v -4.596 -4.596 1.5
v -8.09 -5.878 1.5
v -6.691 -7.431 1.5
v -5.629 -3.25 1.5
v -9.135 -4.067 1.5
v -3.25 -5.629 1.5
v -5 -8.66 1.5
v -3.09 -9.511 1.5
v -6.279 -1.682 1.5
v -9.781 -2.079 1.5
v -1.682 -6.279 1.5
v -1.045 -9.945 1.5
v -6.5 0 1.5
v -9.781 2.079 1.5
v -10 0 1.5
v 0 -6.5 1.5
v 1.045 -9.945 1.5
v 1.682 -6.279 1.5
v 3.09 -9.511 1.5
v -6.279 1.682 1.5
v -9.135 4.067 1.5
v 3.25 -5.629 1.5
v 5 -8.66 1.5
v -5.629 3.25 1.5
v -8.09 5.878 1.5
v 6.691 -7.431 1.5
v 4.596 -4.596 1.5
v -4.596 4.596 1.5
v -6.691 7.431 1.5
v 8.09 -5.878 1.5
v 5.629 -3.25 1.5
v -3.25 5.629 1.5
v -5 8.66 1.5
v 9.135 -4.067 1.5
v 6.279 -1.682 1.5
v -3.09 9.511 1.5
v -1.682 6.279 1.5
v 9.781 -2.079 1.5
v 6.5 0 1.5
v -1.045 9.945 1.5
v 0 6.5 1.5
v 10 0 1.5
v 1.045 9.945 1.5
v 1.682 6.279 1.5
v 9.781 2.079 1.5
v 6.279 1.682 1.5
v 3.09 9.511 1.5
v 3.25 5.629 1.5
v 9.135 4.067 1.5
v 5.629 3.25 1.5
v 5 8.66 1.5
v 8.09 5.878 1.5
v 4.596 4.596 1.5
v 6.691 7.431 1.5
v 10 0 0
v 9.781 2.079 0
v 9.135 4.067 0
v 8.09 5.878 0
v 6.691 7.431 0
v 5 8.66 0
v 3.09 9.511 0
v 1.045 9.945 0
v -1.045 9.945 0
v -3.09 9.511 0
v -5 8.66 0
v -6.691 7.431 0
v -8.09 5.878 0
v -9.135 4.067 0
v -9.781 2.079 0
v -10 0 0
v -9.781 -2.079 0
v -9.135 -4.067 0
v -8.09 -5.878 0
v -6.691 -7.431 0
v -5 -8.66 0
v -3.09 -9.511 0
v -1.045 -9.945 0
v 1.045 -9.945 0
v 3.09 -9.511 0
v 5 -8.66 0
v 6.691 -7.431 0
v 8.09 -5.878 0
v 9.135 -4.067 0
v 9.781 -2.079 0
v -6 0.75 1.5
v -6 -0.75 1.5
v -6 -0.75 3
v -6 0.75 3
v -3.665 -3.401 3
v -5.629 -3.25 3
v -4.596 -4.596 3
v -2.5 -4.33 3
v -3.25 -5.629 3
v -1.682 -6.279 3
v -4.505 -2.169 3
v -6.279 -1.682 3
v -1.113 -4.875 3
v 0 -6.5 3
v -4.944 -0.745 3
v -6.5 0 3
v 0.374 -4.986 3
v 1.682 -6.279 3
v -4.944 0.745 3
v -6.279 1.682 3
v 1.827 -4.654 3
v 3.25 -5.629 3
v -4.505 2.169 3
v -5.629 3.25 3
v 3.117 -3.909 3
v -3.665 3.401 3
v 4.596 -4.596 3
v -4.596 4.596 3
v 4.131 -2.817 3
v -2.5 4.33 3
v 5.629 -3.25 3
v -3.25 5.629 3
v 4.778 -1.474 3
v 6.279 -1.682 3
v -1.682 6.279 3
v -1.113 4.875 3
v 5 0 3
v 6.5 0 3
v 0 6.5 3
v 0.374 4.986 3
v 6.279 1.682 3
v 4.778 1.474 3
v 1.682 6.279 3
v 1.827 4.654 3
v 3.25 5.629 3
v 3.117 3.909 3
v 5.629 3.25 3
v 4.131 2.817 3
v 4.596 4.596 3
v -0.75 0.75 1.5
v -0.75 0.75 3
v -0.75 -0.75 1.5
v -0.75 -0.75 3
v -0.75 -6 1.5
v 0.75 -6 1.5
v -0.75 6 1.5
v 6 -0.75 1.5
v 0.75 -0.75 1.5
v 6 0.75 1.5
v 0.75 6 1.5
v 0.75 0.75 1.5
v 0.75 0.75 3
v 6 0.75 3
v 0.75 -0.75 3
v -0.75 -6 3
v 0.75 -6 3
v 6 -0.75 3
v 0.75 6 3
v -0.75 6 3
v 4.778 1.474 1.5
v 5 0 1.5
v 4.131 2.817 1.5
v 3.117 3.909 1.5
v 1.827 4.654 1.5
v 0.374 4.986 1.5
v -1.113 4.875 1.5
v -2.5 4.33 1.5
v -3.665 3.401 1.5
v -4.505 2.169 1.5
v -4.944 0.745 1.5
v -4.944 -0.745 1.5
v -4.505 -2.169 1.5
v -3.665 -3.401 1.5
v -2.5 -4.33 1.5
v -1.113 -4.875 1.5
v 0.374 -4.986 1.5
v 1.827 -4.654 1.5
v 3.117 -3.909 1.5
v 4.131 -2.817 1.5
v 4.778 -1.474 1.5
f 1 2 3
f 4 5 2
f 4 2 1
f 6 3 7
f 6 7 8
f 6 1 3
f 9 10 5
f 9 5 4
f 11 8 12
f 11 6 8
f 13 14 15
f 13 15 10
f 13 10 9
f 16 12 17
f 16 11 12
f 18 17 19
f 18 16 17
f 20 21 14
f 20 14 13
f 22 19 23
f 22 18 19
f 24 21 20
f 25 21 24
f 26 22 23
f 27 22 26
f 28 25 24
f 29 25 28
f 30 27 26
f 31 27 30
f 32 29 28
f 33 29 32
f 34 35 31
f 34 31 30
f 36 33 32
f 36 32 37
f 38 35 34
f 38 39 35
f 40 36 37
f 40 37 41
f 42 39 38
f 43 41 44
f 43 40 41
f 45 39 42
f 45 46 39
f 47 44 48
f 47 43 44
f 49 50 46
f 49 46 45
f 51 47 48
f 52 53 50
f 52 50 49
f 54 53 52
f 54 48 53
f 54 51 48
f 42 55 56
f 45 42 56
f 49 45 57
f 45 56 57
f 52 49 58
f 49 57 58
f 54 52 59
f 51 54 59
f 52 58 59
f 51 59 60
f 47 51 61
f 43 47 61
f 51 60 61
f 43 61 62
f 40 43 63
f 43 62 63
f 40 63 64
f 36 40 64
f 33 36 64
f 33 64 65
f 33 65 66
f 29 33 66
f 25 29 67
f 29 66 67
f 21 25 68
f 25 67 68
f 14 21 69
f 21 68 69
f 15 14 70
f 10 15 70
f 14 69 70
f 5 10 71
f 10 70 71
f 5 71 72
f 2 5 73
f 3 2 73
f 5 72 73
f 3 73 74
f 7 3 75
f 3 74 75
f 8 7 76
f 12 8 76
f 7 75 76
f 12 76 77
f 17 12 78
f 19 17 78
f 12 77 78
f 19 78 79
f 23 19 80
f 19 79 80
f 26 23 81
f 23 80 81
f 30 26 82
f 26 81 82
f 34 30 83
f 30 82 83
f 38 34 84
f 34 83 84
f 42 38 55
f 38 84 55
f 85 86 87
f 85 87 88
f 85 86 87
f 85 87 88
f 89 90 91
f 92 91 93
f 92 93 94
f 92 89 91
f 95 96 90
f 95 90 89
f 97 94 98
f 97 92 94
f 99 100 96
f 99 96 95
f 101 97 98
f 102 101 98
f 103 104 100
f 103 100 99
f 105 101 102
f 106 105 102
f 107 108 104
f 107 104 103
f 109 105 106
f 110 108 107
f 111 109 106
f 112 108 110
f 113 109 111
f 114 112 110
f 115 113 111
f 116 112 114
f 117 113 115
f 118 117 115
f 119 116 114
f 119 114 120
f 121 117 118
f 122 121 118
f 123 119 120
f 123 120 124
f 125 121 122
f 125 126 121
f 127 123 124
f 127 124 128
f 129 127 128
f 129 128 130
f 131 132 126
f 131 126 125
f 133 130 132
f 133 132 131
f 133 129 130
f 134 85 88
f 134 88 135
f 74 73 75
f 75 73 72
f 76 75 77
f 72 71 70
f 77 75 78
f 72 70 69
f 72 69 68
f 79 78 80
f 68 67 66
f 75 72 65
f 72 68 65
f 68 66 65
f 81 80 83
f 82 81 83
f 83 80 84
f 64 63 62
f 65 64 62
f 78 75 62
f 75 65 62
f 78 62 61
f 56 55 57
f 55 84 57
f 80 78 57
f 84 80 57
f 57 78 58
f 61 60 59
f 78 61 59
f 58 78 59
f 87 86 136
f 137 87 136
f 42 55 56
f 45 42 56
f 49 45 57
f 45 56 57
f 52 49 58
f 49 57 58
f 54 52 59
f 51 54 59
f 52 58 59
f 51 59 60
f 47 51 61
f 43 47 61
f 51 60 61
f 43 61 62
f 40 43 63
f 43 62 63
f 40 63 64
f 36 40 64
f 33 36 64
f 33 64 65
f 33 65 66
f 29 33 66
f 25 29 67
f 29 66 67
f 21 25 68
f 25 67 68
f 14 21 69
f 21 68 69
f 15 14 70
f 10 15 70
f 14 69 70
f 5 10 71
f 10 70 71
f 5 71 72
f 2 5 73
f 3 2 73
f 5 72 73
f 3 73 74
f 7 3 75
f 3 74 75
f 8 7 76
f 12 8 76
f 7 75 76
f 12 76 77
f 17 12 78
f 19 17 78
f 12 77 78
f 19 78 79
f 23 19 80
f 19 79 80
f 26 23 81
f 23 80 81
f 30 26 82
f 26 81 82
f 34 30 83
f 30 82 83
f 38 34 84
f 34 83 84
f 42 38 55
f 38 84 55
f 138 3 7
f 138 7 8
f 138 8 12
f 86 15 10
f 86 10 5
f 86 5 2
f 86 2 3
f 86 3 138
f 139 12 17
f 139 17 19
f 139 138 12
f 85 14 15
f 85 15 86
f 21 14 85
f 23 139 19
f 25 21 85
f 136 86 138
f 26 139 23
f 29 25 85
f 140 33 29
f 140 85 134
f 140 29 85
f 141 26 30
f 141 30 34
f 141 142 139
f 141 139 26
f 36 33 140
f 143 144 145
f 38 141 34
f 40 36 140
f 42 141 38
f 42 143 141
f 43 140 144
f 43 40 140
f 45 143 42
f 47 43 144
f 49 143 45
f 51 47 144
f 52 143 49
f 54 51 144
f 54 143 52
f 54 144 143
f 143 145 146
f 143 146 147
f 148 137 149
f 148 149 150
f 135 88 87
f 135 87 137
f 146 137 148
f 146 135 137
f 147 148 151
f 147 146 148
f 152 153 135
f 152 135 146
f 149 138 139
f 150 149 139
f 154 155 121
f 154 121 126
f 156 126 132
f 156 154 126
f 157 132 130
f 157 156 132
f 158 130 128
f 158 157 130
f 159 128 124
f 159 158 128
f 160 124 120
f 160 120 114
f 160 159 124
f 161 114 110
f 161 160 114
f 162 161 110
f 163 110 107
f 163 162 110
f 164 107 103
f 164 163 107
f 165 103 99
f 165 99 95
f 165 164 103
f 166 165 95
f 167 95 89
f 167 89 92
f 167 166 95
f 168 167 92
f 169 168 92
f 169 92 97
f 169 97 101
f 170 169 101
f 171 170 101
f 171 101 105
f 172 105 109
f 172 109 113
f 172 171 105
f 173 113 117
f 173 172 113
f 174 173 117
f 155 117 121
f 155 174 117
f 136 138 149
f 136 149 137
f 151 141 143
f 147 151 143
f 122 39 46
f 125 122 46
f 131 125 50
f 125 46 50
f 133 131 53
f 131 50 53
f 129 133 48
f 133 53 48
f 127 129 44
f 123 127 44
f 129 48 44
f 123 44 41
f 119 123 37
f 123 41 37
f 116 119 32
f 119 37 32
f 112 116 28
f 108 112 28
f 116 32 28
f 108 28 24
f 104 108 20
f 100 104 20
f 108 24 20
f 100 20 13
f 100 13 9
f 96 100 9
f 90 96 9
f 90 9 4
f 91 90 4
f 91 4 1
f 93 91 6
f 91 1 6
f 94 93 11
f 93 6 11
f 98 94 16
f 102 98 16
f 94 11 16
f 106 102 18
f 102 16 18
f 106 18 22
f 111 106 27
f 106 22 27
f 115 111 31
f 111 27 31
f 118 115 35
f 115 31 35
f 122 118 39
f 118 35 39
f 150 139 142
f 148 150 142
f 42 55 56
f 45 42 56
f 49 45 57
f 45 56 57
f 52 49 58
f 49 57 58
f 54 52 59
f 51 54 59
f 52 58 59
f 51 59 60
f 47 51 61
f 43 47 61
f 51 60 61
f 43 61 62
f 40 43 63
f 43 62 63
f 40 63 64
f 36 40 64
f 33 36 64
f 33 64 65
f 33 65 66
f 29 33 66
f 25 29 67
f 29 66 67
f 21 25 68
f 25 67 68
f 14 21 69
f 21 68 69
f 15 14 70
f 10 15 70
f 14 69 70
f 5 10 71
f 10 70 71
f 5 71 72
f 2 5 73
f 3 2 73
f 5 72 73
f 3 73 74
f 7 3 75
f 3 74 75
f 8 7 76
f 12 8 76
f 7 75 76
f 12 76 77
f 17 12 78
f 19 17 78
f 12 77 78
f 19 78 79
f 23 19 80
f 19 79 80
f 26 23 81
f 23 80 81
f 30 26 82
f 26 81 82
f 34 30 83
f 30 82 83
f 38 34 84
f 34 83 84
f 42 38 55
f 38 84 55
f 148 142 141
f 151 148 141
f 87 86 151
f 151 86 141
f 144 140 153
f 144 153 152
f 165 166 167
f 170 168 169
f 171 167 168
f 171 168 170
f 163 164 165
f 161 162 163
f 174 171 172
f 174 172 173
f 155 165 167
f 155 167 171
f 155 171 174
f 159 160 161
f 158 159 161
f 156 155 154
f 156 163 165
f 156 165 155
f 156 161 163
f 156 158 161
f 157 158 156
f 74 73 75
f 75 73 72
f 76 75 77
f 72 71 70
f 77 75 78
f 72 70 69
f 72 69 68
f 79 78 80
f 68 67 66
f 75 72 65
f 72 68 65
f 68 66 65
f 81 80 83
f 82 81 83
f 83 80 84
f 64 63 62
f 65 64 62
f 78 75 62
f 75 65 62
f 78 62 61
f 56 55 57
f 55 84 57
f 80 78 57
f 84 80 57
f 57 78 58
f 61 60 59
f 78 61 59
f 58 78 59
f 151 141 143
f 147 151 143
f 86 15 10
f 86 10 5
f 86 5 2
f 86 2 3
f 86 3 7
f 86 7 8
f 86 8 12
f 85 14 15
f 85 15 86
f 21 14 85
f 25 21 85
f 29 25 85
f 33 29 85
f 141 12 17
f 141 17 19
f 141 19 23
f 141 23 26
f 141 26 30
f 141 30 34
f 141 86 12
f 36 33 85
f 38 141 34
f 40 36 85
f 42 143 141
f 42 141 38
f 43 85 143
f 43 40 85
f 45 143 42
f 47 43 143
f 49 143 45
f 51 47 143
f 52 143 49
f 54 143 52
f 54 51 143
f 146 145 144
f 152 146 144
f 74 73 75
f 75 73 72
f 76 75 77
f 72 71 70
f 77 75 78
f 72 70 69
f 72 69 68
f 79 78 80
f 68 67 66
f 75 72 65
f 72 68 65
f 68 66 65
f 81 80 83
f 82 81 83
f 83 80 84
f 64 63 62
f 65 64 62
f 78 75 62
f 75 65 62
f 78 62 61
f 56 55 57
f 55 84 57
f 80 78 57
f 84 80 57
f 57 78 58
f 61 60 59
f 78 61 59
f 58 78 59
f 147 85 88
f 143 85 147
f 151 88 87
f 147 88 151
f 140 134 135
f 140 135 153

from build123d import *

# Parameters (mm, degrees)
SKETCH_R      = 10
PAD_DEPTH     = 1.5
SKETCH001_W   = 12
SKETCH001_H   = 1.5
SKETCH001_W_2 = 1.5
SKETCH001_H_2 = 12
PAD001_DEPTH  = 1.5
SKETCH002_R   = 10
PAD002_DEPTH  = 1.5
SKETCH003_W   = 12
SKETCH003_H   = 1.5
PAD003_DEPTH  = 1.5
SKETCH004_R   = 10
PAD004_DEPTH  = 1.5
SKETCH005_R   = 6.5
SKETCH005_R_2 = 5
PAD005_DEPTH  = 1.5


with BuildPart() as yaycoin:
    # Sketch → Pad (new body)
    with BuildSketch(Plane.XY):
        Circle(SKETCH_R)
    extrude(amount=PAD_DEPTH)

    # Sketch001 (on Face3 of Pad) → Pad001 (join)
    with BuildSketch(Plane.XY.offset(1.5)):
        Rectangle(SKETCH001_W, SKETCH001_H)
        Rectangle(SKETCH001_W_2, SKETCH001_H_2)
    extrude(amount=PAD001_DEPTH)


with BuildPart() as naycoin:
    # Sketch002 → Pad002 (new body)
    with BuildSketch(Plane.XY):
        Circle(SKETCH002_R)
    extrude(amount=PAD002_DEPTH)

    # Sketch003 (on Face3 of Pad002) → Pad003 (join)
    with BuildSketch(Plane.XY.offset(1.5)):
        Rectangle(SKETCH003_W, SKETCH003_H)
    extrude(amount=PAD003_DEPTH)


with BuildPart() as abstaincoin:
    # Sketch004 → Pad004 (new body)
    with BuildSketch(Plane.XY):
        Circle(SKETCH004_R)
    extrude(amount=PAD004_DEPTH)

    # Sketch005 (on Face3 of Pad004) → Pad005 (join)
    with BuildSketch(Plane.XY.offset(1.5)):
        Circle(SKETCH005_R)
        Circle(SKETCH005_R_2, mode=Mode.SUBTRACT)
    extrude(amount=PAD005_DEPTH)


solid = Compound([yaycoin.part, naycoin.part, abstaincoin.part])
